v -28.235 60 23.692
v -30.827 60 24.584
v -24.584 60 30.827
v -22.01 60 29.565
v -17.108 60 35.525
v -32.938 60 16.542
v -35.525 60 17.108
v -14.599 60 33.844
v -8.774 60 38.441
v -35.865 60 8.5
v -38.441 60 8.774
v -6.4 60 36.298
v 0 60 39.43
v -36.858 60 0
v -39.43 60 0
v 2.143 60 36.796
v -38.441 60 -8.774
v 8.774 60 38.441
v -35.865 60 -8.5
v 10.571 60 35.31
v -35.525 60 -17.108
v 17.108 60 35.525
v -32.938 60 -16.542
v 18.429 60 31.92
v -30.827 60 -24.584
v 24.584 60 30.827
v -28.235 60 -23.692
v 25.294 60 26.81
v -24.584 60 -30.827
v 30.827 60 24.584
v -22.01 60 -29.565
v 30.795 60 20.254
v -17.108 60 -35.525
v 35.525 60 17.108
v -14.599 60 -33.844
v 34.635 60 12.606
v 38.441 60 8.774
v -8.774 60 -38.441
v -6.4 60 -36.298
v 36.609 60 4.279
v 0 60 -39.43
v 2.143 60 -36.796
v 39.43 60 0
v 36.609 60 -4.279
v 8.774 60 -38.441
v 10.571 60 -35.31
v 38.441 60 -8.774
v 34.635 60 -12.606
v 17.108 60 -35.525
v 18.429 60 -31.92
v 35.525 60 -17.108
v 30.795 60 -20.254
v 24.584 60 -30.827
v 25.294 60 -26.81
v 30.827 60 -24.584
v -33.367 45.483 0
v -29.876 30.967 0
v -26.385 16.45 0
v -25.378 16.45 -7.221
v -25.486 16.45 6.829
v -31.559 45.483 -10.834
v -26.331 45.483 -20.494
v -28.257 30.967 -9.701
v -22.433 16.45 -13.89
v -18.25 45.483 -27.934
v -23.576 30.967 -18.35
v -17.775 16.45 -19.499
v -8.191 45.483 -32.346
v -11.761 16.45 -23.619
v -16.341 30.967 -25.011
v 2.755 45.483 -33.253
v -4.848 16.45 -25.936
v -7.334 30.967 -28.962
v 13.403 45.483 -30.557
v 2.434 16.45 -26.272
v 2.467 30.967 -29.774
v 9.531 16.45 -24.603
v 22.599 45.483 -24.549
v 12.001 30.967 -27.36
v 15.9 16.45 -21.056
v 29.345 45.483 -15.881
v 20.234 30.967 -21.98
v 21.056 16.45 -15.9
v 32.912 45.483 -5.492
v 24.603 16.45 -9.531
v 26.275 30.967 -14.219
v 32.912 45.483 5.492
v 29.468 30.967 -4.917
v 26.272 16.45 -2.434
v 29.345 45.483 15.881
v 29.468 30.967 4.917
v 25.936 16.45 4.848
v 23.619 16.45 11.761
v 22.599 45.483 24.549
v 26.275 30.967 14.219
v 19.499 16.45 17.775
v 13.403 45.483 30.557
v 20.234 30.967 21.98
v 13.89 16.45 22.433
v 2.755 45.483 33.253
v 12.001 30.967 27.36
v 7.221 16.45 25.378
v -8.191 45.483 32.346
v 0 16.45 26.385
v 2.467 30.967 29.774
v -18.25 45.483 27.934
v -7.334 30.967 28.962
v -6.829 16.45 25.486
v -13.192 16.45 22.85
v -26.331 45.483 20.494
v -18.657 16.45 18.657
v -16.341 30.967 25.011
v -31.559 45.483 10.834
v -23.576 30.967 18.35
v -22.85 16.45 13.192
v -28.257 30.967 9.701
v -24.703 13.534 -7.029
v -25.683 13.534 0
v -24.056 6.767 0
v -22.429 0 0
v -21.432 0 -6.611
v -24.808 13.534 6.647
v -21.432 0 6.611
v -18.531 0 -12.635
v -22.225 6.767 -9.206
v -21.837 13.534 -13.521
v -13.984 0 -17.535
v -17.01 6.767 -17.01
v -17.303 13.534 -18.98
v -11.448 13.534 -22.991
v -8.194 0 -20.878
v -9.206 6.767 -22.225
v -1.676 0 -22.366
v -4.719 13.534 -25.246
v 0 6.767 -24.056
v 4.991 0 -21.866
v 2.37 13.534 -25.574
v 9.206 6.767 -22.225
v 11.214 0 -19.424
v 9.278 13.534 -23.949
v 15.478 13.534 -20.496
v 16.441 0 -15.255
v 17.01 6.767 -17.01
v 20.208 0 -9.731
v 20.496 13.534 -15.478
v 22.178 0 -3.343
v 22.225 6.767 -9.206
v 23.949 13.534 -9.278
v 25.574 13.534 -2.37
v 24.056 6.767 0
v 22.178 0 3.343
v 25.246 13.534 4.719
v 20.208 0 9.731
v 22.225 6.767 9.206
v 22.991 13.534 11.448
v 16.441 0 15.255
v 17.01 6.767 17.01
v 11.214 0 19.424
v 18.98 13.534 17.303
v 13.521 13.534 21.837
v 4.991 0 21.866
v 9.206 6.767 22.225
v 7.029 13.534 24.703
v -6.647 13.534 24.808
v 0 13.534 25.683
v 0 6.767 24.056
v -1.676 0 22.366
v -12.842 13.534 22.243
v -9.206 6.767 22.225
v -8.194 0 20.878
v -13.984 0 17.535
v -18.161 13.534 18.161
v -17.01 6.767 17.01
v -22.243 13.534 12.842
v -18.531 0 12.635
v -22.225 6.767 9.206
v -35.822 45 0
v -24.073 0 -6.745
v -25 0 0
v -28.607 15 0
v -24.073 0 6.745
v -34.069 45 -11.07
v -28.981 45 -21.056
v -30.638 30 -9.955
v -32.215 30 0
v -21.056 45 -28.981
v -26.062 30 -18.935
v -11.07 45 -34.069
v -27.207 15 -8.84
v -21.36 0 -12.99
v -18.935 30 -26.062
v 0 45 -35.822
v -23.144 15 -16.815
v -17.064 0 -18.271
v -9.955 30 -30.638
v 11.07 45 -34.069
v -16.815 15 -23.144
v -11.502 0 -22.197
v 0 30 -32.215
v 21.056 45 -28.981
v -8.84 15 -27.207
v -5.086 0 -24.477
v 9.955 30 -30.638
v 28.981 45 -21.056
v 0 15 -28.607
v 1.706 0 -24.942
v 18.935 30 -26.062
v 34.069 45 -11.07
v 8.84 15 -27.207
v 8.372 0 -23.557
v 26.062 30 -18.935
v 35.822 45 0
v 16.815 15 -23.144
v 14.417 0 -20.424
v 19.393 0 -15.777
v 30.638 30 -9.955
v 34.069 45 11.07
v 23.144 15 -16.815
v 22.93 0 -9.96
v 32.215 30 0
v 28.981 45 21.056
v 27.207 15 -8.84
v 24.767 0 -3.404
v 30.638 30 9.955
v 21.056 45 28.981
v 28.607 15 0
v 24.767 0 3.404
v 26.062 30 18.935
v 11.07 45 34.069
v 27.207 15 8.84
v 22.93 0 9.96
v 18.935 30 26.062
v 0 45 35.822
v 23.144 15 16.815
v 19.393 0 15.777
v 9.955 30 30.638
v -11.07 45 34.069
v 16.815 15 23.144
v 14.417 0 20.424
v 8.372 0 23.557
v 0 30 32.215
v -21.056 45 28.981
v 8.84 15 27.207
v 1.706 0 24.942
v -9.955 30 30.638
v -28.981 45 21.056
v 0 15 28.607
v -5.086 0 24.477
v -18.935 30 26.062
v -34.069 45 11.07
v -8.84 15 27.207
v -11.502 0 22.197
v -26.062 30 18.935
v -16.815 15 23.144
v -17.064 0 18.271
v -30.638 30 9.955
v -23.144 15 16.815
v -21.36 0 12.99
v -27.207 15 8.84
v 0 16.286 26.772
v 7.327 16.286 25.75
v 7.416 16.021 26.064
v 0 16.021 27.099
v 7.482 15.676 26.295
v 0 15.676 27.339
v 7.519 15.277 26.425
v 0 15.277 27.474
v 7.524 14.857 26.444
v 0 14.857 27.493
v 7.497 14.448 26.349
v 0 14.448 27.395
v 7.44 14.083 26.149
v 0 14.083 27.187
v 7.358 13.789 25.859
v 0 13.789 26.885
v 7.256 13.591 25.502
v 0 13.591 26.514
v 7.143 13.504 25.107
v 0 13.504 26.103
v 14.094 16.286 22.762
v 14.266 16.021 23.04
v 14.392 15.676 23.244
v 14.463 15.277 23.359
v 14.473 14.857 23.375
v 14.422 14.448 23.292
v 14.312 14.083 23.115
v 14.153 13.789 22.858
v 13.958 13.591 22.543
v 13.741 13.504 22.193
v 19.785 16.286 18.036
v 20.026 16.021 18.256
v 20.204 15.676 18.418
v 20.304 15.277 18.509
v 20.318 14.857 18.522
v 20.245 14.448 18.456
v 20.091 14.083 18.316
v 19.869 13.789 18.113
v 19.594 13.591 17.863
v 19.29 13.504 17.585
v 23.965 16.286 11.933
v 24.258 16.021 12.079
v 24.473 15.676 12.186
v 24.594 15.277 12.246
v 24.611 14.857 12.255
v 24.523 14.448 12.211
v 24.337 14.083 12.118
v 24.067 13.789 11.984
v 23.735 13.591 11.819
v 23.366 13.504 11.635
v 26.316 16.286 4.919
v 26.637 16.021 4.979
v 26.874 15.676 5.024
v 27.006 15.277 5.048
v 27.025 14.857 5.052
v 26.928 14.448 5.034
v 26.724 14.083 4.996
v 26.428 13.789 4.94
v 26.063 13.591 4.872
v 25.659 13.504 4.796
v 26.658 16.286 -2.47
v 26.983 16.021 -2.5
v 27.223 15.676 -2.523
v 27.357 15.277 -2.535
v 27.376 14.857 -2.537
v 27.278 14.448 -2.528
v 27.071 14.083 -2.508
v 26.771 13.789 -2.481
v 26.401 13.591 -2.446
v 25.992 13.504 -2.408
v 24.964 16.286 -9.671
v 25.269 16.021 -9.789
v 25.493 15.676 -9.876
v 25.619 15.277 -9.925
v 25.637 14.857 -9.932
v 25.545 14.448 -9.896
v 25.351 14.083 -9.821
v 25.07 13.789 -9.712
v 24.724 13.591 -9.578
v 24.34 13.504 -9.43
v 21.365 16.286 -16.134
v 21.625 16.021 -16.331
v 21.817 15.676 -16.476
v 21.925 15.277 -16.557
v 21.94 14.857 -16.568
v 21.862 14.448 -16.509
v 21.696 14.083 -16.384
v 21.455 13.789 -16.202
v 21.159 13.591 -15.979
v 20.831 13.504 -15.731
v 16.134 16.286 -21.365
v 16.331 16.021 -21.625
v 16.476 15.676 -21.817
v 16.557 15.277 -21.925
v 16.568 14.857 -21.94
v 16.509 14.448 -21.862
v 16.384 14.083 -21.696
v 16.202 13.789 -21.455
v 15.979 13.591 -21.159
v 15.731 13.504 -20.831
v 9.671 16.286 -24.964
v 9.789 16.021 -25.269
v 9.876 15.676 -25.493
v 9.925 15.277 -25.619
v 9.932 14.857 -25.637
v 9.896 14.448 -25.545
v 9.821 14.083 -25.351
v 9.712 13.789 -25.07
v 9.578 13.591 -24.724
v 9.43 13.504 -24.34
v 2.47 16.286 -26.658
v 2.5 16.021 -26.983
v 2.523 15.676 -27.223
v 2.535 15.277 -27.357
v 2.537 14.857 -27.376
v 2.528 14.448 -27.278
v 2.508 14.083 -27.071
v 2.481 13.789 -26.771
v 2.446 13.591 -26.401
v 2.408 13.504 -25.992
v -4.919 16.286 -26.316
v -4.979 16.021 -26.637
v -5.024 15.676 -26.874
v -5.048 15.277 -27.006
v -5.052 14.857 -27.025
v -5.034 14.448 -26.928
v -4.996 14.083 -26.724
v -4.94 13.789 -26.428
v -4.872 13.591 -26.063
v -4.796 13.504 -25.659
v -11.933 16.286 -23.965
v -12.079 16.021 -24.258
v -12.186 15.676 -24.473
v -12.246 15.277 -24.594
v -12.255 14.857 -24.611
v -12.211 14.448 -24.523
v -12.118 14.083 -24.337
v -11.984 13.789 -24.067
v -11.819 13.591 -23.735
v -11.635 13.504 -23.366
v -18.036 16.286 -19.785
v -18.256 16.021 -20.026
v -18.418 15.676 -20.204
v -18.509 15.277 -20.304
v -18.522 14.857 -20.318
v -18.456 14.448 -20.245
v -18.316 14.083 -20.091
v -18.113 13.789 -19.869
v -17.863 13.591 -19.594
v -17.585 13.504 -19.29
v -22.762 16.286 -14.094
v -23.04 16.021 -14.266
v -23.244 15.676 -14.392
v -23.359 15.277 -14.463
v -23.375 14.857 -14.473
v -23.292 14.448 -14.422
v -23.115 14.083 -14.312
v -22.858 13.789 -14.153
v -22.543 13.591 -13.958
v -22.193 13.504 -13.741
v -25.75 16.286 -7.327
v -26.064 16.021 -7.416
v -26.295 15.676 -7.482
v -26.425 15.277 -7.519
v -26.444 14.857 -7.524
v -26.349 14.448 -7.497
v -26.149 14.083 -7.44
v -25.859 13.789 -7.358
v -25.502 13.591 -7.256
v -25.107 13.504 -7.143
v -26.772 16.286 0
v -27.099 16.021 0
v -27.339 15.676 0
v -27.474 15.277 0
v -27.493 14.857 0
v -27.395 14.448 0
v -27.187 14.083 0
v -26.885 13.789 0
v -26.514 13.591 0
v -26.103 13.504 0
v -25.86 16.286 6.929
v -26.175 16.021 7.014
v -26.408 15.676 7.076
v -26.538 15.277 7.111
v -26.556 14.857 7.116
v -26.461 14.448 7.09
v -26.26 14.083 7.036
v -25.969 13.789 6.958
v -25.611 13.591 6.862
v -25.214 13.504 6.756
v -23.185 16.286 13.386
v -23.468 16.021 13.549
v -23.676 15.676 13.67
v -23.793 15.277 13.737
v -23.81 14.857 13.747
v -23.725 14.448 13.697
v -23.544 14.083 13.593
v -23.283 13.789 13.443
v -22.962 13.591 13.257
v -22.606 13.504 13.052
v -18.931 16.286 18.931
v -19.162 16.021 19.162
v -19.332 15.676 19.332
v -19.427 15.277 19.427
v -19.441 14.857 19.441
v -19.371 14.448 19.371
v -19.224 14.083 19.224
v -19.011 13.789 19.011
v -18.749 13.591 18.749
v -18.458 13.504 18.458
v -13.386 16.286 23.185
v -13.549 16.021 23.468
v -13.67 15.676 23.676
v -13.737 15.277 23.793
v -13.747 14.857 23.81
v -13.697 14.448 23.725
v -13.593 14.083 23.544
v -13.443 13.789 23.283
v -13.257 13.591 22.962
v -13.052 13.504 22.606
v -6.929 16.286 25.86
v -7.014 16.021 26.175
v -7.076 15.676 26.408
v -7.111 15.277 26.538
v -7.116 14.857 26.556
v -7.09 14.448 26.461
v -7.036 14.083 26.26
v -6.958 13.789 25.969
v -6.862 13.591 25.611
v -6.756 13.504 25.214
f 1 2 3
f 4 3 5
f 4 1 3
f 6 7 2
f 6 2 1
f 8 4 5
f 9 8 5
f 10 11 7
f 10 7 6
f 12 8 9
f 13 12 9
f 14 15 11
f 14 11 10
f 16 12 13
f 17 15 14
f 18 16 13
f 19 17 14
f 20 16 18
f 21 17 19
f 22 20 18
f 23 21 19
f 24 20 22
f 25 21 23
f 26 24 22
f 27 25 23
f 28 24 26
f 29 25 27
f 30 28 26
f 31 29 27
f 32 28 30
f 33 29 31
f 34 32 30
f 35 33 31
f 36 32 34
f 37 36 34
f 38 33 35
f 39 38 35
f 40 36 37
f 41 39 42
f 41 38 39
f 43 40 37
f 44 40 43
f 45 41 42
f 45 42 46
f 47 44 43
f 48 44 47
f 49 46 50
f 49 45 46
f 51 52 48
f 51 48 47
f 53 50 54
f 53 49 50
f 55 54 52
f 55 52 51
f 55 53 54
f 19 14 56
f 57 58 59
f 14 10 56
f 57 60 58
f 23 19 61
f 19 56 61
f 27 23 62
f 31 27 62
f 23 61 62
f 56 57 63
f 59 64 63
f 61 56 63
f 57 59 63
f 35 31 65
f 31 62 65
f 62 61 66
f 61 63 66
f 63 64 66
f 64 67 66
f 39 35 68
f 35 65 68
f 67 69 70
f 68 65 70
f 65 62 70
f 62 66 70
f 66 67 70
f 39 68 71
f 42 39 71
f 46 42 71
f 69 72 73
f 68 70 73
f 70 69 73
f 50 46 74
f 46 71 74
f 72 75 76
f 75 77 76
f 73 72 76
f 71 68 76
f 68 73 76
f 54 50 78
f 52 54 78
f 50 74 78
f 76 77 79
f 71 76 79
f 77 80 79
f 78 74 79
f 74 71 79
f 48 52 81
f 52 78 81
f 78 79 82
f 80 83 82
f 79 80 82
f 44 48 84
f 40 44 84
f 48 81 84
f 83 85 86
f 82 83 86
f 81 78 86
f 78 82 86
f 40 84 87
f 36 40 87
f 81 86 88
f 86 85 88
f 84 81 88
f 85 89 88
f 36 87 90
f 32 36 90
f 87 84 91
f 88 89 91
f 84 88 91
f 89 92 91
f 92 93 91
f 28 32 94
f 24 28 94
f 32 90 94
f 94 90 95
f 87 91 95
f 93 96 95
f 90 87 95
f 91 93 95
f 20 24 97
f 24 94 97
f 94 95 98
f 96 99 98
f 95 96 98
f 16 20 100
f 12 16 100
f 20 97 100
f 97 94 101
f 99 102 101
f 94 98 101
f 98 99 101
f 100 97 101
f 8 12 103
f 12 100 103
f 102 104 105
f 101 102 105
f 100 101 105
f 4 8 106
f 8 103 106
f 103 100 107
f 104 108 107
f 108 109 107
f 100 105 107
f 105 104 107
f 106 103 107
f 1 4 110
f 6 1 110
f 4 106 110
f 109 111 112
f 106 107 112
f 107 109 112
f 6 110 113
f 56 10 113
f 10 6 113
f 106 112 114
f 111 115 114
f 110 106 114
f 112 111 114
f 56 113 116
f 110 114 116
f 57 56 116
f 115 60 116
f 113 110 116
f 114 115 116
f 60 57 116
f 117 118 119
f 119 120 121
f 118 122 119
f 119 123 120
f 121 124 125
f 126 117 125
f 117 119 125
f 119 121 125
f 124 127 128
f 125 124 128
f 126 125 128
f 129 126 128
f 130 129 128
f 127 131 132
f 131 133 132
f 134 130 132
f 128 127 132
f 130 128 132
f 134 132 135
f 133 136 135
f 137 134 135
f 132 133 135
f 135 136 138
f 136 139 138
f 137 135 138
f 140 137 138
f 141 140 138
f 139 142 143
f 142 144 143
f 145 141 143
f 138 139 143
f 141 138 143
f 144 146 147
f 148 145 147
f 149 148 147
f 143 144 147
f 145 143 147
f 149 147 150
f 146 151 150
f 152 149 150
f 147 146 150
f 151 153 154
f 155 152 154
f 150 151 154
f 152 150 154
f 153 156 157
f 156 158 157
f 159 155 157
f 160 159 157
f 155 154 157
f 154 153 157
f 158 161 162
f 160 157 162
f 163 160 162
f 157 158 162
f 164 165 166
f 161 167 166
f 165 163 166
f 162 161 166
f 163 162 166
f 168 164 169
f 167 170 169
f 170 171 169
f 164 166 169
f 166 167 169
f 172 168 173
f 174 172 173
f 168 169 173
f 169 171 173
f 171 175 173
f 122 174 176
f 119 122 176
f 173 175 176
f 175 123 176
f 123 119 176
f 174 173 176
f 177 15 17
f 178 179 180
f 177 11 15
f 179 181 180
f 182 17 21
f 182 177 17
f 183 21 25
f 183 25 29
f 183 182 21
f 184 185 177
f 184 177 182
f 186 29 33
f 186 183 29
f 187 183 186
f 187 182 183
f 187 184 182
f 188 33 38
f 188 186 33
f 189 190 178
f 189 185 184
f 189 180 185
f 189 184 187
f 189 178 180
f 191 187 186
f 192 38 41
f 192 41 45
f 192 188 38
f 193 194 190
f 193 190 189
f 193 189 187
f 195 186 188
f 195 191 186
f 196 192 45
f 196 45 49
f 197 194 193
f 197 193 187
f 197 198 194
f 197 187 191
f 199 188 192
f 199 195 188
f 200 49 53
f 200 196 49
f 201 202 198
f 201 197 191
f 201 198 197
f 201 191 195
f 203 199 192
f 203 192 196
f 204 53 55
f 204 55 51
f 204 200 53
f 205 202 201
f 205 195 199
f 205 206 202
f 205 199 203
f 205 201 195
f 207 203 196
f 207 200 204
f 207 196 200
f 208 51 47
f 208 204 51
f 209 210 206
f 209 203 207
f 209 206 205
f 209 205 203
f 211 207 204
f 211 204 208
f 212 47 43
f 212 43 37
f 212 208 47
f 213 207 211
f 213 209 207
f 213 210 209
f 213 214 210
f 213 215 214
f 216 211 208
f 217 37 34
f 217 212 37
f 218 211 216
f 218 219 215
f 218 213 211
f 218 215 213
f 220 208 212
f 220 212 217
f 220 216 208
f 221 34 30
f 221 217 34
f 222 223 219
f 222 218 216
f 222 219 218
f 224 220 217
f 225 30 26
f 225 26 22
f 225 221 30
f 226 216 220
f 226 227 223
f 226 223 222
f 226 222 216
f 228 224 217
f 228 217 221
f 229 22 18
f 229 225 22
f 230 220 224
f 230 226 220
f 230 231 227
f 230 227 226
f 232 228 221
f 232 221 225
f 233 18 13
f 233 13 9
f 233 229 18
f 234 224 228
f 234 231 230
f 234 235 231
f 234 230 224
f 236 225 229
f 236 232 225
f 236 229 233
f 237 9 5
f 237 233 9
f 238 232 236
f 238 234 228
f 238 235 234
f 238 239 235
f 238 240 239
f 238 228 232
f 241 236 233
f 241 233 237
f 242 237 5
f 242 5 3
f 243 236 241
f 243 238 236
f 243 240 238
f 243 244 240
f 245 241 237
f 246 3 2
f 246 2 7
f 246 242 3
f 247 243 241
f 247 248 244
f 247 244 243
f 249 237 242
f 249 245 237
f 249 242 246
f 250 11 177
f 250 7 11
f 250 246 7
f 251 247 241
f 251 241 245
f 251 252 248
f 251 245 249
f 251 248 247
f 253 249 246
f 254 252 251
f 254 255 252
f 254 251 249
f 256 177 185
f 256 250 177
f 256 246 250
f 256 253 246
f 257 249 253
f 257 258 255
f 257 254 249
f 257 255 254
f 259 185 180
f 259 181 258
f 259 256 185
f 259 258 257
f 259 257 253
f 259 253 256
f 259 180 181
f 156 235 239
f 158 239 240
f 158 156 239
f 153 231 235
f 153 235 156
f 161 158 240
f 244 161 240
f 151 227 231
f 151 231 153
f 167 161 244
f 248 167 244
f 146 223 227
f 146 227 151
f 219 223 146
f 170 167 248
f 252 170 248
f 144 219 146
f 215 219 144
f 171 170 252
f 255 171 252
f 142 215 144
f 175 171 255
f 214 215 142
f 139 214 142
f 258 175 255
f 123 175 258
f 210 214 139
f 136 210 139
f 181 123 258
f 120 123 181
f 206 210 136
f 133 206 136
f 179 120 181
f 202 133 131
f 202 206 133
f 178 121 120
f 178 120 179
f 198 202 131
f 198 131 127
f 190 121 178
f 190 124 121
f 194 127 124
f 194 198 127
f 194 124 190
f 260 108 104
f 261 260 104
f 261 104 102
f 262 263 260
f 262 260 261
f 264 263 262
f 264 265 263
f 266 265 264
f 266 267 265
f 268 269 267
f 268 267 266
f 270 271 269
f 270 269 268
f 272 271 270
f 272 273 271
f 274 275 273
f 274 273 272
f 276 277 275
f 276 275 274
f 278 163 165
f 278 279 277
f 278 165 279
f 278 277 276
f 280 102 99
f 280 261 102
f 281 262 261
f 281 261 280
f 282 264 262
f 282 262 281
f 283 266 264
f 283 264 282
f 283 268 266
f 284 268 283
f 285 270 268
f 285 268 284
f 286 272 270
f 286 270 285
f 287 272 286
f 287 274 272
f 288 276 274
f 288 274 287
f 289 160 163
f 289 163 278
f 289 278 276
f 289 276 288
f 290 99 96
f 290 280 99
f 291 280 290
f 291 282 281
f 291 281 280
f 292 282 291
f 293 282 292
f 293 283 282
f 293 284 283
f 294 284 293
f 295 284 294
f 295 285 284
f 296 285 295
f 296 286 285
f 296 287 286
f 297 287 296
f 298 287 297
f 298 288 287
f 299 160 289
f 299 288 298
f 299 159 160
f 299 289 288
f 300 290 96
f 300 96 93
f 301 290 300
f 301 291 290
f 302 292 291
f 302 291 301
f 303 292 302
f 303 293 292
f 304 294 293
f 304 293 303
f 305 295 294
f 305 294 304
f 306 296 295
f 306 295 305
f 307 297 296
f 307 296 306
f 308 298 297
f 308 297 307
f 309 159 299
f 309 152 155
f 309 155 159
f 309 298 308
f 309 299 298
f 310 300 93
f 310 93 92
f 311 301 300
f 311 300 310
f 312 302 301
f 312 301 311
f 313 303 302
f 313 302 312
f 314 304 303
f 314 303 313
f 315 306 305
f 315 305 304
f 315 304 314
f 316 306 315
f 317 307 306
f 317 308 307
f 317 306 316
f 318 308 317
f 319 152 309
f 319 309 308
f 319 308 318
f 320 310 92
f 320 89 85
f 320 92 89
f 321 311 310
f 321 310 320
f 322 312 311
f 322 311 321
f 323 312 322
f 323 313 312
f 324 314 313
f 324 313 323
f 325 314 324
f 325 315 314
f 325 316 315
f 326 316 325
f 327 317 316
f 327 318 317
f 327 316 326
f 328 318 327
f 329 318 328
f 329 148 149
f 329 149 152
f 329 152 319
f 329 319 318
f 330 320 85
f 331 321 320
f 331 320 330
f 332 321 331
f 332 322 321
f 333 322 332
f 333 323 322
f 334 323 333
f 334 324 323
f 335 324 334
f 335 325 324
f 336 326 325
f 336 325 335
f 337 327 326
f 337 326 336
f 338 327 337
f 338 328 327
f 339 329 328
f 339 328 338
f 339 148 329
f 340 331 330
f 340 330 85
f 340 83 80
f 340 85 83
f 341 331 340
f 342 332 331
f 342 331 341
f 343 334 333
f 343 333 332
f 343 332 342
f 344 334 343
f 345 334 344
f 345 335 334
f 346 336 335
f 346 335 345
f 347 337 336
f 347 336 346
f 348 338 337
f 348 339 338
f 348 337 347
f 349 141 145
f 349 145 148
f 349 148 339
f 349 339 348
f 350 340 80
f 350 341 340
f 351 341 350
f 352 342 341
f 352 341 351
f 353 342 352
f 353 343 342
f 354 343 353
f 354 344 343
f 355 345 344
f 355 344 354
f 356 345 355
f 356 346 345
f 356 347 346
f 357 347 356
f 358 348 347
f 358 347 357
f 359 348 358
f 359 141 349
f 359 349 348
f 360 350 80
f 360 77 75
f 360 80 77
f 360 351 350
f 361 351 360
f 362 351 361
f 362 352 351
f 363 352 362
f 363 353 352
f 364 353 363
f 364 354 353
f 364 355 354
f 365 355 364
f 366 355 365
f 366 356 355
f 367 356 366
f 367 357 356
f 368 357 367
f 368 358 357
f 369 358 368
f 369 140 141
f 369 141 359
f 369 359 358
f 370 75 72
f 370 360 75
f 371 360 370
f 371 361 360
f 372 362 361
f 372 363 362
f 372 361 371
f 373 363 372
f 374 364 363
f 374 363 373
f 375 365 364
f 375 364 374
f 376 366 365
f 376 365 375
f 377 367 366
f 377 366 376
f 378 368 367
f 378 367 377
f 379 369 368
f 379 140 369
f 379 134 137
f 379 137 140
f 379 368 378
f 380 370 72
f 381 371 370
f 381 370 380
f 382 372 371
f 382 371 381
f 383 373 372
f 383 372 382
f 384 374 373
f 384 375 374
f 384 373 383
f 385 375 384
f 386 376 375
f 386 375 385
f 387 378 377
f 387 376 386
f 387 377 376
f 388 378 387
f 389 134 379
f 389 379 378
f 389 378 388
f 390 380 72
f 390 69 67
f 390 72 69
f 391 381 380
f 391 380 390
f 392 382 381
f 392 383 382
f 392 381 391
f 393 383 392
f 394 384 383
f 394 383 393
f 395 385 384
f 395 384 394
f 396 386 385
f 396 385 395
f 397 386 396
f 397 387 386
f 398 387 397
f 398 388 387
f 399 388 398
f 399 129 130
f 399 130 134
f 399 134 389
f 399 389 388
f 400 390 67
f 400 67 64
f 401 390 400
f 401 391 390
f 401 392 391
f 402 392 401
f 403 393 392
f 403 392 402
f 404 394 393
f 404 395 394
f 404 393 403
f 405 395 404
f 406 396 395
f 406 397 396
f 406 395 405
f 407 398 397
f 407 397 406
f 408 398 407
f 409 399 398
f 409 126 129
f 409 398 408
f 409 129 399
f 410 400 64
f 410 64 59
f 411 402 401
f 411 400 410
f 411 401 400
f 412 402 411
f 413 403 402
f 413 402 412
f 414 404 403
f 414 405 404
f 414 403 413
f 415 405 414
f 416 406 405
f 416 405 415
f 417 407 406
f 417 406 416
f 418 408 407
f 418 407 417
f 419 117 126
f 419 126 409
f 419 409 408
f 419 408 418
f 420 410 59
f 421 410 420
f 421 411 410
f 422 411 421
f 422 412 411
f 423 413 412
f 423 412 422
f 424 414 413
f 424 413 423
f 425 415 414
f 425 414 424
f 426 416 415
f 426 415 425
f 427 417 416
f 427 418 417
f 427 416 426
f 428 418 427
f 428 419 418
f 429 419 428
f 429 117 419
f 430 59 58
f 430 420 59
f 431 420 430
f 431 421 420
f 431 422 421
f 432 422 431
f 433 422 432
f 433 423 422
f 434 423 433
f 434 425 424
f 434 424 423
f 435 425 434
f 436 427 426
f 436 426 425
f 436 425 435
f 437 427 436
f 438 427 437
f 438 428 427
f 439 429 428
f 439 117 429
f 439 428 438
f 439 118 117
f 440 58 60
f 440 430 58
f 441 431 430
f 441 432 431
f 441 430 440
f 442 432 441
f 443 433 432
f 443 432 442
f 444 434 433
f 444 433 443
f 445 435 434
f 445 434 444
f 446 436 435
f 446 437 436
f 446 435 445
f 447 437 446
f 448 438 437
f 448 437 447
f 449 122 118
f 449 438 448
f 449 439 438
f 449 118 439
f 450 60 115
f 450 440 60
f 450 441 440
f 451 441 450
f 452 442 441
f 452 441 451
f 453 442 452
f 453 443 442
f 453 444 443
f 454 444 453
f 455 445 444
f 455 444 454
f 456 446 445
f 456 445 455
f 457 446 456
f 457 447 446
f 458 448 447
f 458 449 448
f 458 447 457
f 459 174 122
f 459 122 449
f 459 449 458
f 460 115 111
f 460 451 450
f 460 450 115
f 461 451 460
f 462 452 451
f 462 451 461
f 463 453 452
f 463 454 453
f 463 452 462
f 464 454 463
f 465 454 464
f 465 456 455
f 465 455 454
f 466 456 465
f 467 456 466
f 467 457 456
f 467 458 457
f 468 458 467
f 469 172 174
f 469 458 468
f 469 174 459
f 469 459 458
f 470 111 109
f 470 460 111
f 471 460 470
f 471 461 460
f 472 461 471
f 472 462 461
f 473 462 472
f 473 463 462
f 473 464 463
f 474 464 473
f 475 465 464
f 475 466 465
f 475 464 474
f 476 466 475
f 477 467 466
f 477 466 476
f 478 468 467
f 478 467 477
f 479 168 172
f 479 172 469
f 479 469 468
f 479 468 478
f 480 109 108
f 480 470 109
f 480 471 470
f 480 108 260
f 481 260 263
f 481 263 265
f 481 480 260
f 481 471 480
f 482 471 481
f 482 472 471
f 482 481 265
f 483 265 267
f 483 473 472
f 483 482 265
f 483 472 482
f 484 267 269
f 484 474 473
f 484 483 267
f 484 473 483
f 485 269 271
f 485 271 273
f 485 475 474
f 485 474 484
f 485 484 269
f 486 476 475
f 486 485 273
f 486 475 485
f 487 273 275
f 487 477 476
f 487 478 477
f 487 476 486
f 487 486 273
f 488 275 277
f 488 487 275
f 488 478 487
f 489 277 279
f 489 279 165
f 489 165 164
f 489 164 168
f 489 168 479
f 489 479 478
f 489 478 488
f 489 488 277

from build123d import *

# Parameters (mm, degrees)
F2_T = -2.5
F3_R = 1.5


with BuildPart() as f1:
    # F0 (on Top) → F1 (revolve)
    with BuildSketch(Plane.XY):
        Polygon((-39.429533, 60), (-25, 0), (0, 0), (0, 60), align=None)
    revolve(axis=Axis((0, 30, 0), (0, -1, 0)))

    # F2
    f2_openings = [f1.faces().sort_by_distance(p)[0] for p in [
        (0, 60, 0),
        (0, 0, 0),
    ]]
    offset(amount=F2_T, openings=f2_openings)

    # F3 (on Right) → F4 (revolve, cut)
    with BuildSketch(Plane.YZ):
        with Locations((15, 26)):
            Circle(F3_R)
    revolve(axis=Axis((0, 19.297946, 0), (0, 1, 0)), mode=Mode.SUBTRACT)


solid = f1.part
